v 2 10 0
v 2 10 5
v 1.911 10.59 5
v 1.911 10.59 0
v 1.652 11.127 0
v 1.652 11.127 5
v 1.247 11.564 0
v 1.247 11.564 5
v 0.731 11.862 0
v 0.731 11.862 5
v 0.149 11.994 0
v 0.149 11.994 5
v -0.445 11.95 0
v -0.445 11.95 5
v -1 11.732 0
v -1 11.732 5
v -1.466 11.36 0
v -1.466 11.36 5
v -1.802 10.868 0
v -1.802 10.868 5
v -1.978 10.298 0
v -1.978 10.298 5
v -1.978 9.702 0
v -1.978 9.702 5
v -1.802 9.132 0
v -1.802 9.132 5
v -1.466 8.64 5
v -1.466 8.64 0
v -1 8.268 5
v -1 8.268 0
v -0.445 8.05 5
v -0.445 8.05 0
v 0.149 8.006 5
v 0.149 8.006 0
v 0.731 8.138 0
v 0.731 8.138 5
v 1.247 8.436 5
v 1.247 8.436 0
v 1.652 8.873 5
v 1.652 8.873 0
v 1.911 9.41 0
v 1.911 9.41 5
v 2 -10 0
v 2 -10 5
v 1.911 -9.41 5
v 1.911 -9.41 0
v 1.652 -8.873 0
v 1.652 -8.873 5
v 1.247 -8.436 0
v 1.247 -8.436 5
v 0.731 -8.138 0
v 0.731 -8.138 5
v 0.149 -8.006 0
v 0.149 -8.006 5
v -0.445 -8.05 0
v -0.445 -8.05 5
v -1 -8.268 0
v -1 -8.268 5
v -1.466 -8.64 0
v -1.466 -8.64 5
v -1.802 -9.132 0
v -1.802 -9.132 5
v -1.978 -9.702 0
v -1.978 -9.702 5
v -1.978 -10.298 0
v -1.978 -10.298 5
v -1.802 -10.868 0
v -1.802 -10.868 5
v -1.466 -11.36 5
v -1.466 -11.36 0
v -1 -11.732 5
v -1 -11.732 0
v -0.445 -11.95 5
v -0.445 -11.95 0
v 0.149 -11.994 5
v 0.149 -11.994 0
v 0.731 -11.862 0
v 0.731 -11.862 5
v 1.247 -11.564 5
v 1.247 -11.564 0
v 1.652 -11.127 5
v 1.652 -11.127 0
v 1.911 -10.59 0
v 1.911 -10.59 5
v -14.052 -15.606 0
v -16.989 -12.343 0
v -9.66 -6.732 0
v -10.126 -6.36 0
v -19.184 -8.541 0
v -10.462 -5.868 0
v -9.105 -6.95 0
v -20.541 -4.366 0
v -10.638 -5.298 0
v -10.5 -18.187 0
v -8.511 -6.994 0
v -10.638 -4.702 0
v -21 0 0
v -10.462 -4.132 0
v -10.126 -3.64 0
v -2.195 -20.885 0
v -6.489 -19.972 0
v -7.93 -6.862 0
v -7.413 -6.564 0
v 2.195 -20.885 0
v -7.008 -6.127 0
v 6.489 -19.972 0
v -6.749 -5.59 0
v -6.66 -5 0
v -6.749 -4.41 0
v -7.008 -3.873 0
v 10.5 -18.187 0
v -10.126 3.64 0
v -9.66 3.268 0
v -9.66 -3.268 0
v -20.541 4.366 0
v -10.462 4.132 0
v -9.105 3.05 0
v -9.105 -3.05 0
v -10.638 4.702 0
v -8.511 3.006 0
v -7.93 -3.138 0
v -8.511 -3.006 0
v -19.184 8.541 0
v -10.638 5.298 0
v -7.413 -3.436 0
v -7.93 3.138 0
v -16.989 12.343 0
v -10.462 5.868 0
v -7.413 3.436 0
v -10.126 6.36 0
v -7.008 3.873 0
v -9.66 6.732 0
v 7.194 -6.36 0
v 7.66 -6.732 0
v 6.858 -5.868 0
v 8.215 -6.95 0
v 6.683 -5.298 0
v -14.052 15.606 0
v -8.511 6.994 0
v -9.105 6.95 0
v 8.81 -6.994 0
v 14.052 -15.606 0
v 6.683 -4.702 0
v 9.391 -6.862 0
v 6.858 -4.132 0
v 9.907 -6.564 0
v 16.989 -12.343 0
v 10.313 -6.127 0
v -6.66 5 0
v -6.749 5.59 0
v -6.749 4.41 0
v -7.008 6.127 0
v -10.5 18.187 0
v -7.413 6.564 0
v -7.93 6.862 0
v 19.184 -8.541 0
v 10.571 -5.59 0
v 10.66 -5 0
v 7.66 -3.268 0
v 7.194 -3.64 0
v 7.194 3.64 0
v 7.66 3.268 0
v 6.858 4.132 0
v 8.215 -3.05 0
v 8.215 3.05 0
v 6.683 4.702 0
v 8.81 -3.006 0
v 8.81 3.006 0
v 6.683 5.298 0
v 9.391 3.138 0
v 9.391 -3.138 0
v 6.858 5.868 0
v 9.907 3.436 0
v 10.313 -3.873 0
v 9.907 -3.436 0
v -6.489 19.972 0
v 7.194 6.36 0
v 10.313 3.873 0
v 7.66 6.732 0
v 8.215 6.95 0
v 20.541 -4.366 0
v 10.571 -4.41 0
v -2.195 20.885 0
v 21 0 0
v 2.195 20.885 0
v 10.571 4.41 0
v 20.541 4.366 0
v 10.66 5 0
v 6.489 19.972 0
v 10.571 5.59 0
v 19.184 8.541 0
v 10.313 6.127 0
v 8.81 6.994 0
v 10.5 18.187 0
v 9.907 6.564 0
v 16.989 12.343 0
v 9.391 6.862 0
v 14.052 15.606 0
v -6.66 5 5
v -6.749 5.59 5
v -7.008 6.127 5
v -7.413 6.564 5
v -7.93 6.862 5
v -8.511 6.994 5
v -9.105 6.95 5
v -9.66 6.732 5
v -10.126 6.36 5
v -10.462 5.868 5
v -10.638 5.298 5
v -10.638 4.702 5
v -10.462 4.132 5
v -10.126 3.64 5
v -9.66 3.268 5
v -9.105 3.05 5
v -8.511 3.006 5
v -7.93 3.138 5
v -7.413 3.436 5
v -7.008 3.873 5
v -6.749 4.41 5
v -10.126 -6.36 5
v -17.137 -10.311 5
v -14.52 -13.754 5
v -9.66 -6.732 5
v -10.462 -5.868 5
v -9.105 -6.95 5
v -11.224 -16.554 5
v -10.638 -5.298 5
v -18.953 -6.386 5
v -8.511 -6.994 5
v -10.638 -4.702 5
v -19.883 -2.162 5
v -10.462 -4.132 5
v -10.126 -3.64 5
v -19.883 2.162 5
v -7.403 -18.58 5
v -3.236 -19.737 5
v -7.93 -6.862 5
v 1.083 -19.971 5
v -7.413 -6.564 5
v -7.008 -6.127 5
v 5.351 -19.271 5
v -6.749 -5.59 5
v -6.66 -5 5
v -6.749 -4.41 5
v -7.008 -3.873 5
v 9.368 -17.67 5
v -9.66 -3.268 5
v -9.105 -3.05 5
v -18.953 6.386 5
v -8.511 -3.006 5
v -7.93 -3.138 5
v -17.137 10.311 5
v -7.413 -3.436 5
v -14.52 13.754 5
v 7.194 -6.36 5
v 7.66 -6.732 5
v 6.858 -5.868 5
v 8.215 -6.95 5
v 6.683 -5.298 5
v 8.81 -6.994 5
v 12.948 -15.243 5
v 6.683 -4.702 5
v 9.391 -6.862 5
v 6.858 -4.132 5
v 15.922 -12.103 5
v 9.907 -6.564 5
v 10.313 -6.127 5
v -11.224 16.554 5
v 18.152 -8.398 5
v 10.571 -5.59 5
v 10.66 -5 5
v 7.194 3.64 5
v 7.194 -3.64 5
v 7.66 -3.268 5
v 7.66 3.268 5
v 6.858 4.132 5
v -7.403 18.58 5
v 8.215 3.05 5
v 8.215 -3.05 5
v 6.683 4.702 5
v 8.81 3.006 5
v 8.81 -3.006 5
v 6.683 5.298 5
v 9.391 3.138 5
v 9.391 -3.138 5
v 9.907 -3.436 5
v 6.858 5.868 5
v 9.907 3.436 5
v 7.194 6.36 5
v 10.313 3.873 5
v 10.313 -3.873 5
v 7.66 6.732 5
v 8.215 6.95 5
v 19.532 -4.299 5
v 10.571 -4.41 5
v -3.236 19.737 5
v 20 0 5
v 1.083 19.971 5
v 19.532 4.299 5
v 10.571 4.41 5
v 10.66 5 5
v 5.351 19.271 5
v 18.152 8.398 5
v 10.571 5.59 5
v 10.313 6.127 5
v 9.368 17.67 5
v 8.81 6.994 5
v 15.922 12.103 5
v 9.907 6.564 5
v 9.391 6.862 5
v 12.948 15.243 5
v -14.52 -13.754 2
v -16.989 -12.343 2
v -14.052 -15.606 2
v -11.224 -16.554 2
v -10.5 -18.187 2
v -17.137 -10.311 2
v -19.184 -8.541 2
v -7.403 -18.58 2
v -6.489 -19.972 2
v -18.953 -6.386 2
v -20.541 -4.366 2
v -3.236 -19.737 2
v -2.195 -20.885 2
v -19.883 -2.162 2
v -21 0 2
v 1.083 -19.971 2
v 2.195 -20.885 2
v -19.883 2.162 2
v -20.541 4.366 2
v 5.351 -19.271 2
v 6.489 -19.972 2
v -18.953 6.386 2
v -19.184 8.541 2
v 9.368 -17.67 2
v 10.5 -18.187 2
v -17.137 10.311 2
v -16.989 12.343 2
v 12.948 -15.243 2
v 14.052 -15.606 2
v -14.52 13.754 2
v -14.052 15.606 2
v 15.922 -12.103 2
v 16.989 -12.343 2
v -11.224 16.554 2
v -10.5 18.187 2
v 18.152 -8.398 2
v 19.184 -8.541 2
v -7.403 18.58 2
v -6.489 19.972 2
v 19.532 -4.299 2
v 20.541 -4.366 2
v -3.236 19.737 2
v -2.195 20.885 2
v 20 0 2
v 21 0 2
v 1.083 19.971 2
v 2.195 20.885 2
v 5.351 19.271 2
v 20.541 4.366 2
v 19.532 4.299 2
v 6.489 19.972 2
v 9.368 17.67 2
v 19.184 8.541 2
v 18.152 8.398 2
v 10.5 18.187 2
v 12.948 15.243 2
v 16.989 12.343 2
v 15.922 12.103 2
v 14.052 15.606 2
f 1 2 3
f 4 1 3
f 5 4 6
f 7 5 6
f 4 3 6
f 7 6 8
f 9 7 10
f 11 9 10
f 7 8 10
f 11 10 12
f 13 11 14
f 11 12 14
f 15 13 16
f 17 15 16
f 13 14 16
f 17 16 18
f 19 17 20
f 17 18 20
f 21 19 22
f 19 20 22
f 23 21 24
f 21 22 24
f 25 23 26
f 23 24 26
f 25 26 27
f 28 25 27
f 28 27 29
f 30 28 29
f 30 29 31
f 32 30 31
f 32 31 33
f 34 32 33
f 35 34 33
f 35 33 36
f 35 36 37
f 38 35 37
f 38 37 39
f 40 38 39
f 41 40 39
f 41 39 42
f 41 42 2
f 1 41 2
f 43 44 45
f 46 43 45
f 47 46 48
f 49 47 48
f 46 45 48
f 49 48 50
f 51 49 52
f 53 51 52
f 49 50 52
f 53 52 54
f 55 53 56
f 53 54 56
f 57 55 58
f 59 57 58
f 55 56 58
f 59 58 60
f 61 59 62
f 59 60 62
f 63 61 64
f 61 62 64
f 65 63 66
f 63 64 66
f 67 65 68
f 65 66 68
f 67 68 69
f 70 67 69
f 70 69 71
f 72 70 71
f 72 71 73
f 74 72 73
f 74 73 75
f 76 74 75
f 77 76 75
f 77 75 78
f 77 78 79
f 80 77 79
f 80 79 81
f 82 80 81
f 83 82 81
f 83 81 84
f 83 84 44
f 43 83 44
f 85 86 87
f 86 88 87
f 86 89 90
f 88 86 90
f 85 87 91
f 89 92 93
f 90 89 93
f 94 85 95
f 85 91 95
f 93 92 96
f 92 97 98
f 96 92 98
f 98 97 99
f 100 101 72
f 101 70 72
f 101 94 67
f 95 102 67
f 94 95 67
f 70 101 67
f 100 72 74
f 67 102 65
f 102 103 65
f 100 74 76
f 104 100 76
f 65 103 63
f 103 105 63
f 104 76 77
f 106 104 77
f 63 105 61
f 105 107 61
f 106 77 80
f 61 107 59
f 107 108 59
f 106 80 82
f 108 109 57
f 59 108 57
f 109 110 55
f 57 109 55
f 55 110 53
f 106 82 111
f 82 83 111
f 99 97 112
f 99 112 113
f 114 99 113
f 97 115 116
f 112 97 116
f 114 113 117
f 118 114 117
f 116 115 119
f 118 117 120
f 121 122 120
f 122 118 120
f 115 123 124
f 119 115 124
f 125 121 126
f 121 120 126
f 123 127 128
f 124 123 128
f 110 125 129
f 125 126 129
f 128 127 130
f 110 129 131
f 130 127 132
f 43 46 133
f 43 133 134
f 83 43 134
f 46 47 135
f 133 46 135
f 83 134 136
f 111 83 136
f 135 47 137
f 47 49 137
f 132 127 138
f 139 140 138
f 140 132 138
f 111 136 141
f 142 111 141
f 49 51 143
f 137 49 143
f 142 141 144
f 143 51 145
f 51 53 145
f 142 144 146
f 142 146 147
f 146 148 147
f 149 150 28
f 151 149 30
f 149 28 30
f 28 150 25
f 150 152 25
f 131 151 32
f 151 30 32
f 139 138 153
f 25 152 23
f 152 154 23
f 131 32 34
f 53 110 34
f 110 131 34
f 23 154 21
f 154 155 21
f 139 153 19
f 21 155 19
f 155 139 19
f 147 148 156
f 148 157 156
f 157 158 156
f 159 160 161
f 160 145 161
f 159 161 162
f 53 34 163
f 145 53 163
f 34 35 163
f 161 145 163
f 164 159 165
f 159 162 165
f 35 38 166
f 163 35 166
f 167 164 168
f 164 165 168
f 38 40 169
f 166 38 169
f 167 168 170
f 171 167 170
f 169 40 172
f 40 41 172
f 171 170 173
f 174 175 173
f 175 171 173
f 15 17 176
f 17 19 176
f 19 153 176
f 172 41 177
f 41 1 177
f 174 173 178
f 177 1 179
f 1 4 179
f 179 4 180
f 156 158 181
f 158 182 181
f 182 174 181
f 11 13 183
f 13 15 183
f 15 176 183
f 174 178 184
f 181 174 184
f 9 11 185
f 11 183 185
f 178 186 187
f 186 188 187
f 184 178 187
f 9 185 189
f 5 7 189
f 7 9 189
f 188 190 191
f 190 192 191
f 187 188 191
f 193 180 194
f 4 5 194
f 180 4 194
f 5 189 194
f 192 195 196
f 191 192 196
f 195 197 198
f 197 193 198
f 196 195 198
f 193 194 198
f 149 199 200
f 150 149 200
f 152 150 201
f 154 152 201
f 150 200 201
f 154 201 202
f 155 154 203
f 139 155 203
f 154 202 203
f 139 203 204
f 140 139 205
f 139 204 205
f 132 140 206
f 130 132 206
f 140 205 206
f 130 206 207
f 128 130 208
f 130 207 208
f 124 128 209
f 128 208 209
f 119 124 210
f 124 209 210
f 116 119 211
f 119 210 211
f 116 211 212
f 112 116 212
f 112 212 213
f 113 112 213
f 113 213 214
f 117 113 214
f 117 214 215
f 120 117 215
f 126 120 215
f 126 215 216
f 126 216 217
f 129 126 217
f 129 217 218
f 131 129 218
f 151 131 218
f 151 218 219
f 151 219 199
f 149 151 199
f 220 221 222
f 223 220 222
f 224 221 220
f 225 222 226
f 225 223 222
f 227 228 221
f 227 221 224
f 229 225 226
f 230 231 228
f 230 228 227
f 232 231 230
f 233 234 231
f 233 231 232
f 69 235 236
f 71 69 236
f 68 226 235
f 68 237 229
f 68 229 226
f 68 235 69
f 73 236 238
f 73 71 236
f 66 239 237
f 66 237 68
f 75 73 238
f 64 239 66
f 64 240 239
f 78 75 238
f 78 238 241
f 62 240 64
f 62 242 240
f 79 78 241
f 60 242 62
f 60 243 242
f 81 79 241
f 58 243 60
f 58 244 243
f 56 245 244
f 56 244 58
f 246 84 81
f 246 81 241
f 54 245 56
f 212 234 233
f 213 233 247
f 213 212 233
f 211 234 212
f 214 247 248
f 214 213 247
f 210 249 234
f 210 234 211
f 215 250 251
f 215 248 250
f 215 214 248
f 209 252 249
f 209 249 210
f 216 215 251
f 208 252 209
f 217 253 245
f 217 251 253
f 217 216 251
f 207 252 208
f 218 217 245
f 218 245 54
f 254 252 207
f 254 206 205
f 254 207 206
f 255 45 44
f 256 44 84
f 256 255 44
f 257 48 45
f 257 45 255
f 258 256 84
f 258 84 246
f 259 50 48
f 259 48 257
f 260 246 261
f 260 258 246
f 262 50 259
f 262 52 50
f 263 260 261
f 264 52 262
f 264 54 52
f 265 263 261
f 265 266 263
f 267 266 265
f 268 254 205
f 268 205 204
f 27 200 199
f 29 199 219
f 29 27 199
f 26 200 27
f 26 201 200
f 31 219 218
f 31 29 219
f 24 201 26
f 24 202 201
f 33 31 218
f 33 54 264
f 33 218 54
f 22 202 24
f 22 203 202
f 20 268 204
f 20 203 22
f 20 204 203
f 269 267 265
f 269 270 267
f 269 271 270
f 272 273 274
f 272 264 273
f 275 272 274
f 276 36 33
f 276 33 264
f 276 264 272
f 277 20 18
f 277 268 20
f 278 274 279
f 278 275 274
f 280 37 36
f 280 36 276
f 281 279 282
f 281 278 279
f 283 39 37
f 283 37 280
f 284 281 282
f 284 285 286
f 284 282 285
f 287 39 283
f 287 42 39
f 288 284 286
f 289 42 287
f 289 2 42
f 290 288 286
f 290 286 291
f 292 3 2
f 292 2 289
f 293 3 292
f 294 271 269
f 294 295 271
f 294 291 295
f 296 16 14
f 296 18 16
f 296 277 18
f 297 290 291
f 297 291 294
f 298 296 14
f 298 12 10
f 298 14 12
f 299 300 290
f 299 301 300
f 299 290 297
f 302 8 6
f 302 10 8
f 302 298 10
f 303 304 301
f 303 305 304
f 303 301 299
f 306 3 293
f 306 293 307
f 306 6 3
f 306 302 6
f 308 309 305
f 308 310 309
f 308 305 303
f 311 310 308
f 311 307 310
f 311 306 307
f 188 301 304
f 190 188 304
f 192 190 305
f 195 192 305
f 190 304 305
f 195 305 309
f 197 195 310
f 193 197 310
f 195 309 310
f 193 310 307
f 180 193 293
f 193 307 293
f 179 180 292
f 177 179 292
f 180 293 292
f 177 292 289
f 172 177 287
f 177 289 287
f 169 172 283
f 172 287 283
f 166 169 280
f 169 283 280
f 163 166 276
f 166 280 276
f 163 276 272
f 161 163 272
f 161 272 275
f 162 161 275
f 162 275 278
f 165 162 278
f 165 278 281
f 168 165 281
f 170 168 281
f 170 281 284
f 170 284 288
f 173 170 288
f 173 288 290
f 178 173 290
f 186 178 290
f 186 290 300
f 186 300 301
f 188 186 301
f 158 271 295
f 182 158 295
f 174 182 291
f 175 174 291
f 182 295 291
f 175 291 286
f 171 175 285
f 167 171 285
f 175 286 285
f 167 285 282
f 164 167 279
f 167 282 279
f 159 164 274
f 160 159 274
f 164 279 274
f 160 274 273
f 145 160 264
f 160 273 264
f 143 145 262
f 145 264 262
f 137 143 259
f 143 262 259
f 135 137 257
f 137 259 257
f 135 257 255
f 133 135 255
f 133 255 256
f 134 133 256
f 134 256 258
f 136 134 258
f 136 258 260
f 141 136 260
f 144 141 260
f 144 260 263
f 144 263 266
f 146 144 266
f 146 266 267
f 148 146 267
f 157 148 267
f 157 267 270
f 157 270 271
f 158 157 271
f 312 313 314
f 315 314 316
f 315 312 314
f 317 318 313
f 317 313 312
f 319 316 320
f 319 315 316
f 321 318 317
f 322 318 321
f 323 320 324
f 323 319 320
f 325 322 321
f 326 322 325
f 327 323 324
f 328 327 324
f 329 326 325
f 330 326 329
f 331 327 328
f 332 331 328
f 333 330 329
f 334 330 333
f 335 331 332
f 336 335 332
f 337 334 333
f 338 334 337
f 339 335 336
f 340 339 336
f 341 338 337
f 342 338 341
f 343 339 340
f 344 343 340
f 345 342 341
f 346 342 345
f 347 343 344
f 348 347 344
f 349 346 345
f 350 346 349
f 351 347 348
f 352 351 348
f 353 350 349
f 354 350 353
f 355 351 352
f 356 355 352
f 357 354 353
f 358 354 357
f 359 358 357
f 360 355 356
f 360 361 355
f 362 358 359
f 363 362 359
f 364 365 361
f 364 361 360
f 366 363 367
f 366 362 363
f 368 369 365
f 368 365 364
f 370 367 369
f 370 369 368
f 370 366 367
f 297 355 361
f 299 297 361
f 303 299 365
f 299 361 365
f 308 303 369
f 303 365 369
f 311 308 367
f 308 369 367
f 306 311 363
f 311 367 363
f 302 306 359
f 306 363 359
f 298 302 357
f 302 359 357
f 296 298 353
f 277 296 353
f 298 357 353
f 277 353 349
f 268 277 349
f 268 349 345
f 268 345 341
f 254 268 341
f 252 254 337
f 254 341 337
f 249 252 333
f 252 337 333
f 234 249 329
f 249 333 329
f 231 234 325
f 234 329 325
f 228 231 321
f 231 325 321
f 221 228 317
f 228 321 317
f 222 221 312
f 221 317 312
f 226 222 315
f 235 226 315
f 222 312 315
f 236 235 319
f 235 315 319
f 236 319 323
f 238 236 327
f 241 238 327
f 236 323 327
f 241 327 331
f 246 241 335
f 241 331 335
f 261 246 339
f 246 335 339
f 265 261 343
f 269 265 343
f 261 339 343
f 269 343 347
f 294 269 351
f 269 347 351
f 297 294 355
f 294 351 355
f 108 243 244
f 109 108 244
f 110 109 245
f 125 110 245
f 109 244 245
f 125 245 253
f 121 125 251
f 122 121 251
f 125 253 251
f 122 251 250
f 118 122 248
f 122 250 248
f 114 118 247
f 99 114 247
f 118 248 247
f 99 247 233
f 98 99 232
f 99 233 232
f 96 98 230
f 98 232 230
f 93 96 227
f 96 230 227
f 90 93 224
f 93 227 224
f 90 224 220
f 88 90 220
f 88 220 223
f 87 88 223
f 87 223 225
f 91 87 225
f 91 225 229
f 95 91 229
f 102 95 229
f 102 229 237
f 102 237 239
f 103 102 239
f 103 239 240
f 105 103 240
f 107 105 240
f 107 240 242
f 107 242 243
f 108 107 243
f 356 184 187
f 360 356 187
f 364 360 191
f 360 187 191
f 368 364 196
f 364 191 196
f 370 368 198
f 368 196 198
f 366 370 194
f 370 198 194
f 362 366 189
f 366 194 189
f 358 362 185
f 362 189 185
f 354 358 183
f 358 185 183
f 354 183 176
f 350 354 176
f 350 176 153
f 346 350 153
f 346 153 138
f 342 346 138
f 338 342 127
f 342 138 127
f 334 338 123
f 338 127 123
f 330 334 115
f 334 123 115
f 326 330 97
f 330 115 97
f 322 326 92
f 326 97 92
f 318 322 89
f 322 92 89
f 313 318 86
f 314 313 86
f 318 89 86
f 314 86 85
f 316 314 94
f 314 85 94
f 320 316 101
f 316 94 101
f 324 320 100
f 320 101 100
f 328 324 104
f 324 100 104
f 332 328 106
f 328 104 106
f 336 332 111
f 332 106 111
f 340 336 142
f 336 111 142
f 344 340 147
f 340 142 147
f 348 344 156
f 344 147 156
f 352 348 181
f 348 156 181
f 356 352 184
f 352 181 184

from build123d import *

# Parameters (mm, degrees)
SKETCH_1_R          = 21
EXTRUDE_1_DEPTH     = 2
SKETCH_2_R          = 20
EXTRUDE_2_DEPTH     = 3
SKETCH_3_R          = 2
CUT_EXTRUDE_1_DEPTH = 31.116440693


with BuildPart() as part:
    # 草图1 → 凸台-拉伸1 (new body)
    with BuildSketch(Plane.XY):
        Circle(SKETCH_1_R)
    extrude(amount=EXTRUDE_1_DEPTH)

    # 草图2 → 凸台-拉伸2 (add)
    with BuildSketch(Plane.XY.offset(2)):
        Circle(SKETCH_2_R)
    extrude(amount=EXTRUDE_2_DEPTH)

    # 草图3 → 切除-拉伸1 (cut, through all)
    with BuildSketch(Plane.XY.offset(5)):
        with Locations((0, 10)):
            Circle(SKETCH_3_R)
        with Locations((8.660254038, 5)):
            Circle(SKETCH_3_R)
        with Locations((8.660254038, -5)):
            Circle(SKETCH_3_R)
        with Locations((0, -10)):
            Circle(SKETCH_3_R)
        with Locations((-8.660254038, -5)):
            Circle(SKETCH_3_R)
        with Locations((-8.660254038, 5)):
            Circle(SKETCH_3_R)
    extrude(amount=-CUT_EXTRUDE_1_DEPTH, mode=Mode.SUBTRACT)


solid = part.part
